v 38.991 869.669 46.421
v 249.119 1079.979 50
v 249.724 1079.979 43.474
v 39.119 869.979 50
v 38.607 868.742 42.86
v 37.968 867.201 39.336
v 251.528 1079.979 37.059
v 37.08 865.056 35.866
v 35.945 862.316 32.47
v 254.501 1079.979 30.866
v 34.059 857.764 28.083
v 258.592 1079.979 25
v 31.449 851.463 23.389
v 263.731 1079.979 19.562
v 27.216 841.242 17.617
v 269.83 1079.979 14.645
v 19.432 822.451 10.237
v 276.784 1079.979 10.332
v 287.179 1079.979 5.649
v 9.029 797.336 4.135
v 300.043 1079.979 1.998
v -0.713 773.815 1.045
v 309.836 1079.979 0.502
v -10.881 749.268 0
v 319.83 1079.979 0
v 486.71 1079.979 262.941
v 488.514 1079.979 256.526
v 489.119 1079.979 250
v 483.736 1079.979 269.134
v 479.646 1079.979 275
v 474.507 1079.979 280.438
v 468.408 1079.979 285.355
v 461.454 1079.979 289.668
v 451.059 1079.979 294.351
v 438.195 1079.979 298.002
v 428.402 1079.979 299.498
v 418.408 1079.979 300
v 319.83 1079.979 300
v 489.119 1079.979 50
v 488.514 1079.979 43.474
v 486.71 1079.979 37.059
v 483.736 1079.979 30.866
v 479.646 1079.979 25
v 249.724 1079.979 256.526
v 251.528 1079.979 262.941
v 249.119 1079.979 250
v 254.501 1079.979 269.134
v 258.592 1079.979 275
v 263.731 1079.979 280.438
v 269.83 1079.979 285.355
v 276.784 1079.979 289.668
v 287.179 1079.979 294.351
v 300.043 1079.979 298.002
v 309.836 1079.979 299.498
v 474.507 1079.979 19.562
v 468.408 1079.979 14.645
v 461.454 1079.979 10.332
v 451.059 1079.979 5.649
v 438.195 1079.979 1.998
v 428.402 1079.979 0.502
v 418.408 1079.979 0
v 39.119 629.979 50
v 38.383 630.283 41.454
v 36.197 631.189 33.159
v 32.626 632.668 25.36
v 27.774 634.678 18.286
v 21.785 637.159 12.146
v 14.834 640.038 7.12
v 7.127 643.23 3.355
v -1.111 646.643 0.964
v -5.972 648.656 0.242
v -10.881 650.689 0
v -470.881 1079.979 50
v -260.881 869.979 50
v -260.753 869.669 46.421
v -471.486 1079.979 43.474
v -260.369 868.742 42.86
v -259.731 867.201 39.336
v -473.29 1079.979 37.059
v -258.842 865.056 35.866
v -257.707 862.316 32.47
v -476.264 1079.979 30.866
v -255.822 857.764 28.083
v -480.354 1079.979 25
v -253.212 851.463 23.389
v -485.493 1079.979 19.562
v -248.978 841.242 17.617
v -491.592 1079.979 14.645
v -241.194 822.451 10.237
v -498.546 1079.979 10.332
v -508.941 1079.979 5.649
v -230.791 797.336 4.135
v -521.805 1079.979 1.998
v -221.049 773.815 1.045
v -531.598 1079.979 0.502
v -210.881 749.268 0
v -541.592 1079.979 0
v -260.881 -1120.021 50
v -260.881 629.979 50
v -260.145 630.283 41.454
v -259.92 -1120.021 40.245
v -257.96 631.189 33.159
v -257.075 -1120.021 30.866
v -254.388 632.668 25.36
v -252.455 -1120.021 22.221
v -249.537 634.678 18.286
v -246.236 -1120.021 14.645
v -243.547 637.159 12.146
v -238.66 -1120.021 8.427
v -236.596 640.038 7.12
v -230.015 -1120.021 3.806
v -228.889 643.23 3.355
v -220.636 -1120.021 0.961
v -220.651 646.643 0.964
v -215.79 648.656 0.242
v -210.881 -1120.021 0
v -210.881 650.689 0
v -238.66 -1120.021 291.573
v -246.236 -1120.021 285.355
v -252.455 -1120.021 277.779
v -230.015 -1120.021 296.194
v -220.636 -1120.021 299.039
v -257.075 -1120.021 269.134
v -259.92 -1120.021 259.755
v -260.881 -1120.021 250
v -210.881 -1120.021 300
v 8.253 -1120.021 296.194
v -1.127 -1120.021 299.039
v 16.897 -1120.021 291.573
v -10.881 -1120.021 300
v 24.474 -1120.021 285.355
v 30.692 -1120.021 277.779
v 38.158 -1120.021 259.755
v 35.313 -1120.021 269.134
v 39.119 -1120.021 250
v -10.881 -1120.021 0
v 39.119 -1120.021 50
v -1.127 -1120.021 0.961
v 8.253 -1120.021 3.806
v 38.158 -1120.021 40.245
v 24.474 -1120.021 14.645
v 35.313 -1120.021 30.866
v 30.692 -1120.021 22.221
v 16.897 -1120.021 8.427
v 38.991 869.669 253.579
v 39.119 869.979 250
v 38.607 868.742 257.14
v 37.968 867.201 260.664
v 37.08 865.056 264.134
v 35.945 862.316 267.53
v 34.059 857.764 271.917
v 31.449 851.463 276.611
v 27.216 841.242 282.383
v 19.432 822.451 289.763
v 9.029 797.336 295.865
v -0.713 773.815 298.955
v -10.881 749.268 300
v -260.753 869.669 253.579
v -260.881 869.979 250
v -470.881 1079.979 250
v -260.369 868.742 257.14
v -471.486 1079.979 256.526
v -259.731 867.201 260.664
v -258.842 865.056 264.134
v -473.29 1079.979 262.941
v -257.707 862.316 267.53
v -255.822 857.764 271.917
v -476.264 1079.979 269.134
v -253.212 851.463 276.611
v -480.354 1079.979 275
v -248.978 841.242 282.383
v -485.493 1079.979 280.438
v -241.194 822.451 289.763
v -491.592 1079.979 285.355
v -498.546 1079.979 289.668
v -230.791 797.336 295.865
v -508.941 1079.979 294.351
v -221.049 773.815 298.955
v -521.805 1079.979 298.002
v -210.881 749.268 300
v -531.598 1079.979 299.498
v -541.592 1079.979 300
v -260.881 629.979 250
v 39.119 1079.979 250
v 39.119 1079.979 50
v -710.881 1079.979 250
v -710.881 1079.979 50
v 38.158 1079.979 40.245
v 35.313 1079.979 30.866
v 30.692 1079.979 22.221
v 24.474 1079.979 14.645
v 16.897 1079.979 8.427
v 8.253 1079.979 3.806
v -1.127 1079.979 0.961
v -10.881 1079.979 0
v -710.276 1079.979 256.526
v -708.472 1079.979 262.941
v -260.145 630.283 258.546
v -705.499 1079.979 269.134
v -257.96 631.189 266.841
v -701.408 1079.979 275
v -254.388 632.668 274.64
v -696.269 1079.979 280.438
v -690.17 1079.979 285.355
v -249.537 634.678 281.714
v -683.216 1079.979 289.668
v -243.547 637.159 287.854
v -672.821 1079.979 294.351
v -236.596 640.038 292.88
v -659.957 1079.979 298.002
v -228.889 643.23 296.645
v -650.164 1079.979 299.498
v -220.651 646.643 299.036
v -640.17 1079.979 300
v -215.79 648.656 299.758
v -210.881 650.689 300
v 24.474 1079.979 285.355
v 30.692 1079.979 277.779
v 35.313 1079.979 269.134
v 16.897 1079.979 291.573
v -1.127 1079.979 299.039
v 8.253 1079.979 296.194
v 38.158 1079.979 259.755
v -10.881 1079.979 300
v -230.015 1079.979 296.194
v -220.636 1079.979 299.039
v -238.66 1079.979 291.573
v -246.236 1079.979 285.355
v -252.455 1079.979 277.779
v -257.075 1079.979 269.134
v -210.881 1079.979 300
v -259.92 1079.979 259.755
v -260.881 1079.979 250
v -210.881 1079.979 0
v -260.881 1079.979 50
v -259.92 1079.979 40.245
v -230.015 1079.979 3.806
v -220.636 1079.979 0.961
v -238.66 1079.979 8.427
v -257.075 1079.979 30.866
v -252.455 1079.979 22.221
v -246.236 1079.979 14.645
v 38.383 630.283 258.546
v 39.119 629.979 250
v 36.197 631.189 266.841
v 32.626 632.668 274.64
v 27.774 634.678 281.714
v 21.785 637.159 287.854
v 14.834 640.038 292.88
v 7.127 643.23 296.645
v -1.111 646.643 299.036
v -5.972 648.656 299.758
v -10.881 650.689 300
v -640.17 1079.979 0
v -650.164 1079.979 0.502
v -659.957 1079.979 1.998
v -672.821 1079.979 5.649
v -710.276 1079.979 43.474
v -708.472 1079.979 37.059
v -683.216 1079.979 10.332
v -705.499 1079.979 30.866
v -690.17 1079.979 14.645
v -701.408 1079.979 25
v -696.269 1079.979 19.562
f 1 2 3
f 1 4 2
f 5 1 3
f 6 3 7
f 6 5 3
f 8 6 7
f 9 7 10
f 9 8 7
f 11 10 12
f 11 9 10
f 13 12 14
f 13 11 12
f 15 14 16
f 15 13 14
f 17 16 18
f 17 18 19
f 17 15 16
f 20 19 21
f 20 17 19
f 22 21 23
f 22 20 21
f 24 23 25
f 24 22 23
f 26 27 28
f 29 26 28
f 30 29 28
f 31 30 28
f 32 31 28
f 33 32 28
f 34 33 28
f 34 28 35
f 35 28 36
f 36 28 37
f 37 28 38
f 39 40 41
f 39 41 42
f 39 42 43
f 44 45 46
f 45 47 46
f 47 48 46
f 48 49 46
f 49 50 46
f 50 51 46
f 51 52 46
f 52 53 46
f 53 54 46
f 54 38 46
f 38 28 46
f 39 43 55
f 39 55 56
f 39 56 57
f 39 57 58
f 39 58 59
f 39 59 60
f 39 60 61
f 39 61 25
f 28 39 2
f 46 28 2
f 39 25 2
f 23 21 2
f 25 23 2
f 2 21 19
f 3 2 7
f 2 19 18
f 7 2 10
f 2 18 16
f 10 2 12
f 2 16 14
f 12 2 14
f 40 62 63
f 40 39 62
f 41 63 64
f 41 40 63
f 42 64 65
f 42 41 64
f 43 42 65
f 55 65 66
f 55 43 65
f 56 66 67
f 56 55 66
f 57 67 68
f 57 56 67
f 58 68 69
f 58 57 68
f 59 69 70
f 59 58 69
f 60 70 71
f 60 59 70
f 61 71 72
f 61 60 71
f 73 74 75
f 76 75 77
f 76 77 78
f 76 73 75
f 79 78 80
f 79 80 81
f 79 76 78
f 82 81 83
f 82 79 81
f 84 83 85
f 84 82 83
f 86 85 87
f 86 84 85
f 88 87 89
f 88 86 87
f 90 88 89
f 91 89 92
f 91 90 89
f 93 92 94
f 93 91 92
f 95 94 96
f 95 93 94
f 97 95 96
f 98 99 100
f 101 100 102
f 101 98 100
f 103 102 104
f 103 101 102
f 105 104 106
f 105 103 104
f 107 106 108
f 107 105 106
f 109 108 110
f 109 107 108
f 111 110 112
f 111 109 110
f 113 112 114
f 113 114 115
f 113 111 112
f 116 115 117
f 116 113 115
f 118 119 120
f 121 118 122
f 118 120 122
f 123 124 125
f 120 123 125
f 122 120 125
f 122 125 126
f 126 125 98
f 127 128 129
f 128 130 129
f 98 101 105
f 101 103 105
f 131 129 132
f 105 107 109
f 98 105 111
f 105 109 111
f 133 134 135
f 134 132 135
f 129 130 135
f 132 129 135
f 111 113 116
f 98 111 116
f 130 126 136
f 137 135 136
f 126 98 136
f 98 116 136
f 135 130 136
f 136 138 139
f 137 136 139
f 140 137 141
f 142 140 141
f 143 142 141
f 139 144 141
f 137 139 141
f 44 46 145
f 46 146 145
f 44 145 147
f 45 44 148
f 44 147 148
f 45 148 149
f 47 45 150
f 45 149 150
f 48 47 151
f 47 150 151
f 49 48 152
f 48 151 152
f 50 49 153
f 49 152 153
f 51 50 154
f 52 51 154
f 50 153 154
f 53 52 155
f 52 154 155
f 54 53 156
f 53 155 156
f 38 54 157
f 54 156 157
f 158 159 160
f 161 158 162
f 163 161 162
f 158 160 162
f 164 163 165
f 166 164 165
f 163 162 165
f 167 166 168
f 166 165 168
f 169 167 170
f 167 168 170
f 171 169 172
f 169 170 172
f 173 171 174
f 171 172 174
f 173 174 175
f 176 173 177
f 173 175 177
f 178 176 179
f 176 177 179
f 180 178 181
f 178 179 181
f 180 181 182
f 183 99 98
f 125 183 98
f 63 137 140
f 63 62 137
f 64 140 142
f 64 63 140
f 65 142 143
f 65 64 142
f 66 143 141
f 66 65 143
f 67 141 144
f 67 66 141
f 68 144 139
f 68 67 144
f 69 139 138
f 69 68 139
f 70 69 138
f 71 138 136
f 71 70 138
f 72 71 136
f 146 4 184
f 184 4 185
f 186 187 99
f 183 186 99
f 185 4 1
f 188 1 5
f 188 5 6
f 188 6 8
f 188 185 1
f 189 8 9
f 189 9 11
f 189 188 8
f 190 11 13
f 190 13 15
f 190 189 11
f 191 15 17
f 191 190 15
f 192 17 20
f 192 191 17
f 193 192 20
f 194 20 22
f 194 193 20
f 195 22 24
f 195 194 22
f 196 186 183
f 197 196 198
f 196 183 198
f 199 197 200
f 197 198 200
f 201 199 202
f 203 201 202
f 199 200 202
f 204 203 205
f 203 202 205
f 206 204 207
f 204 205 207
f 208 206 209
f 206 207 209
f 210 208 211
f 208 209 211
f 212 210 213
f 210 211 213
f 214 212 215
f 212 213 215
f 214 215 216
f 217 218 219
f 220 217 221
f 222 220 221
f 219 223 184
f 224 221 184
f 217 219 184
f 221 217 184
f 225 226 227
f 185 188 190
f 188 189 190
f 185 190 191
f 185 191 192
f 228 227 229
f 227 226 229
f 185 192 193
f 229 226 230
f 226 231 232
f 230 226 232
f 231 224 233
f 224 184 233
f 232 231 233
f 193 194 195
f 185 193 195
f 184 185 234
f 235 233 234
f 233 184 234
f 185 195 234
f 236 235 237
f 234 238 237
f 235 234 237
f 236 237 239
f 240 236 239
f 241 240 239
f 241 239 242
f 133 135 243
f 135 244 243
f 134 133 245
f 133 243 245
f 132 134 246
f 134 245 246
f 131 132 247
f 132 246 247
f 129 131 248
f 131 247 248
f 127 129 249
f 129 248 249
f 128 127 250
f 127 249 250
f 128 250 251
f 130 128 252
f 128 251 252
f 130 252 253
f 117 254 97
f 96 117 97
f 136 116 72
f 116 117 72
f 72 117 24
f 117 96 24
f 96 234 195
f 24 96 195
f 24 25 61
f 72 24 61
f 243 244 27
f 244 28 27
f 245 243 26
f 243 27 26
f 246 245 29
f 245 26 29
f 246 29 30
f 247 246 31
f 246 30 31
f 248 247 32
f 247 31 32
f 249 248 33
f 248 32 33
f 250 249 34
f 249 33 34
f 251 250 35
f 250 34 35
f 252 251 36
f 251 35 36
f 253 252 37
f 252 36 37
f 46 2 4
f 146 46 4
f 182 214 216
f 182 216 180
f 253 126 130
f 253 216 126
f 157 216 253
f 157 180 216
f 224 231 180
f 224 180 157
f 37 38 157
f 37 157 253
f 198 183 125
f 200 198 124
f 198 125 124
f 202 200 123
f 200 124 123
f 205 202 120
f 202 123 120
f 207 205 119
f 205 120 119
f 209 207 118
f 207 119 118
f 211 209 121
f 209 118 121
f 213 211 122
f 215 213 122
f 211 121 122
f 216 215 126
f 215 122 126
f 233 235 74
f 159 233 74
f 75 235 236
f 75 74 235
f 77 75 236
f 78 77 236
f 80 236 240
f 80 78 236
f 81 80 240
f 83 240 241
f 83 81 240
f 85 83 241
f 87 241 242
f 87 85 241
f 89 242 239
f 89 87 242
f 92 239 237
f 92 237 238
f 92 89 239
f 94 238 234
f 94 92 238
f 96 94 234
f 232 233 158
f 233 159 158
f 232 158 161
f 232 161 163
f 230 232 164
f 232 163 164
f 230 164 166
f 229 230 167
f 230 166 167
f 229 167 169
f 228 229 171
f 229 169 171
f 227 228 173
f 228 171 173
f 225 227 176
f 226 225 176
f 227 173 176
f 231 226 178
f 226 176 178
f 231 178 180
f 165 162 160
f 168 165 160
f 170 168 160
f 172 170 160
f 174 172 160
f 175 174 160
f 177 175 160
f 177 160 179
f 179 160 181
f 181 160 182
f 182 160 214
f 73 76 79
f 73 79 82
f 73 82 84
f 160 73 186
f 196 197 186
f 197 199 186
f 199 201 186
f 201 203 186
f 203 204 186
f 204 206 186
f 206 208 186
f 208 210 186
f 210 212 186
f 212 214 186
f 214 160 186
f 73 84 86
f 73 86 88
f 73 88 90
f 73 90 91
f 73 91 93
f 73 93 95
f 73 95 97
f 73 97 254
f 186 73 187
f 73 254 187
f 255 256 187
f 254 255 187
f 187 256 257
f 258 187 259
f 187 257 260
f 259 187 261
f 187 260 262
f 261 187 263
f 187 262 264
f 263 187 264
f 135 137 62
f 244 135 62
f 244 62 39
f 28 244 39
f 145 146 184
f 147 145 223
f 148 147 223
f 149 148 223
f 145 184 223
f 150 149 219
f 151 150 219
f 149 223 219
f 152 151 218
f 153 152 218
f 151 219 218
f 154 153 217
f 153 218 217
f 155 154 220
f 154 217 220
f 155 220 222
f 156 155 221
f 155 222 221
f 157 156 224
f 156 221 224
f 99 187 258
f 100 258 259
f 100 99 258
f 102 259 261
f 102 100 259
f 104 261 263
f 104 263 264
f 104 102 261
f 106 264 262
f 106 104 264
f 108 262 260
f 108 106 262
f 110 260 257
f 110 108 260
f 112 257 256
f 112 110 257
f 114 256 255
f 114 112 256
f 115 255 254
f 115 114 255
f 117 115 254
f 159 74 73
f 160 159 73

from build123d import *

# Parameters (mm, degrees)
F1_DEPTH = 300
F2_R     = 50


with BuildPart() as f1:
    # F0 (on Top) → F1 (new body)
    with BuildSketch(Plane.XY):
        Polygon((-260.881037, 629.978729), (-260.881037, -1120.021271), (39.118963, -1120.021271), (39.118963, 629.978729), (489.118963, 1079.978729), (249.118963, 1079.978729), (39.118963, 869.978729), (39.118963, 1079.978729), (-260.881037, 1079.978729), (-260.881037, 869.978729), (-470.881037, 1079.978729), (-710.881037, 1079.978729), align=None)
    extrude(amount=F1_DEPTH)

    # F2
    f2_edges = [f1.edges().sort_by_distance(p)[0] for p in [
        (-260.881037, -245.021271, 300),
        (39.118963, -245.021271, 300),
        (39.118963, -245.021271, 0),
        (-260.881037, -245.021271, 0),
        (39.118963, 974.978729, 0),
        (-260.881037, 974.978729, 0),
        (39.118963, 974.978729, 300),
        (-260.881037, 974.978729, 300),
        (-365.881037, 974.978729, 300),
        (-485.881037, 854.978729, 300),
        (264.118963, 854.978729, 300),
        (264.118963, 854.978729, 0),
        (144.118963, 974.978729, 0),
        (-365.881037, 974.978729, 0),
        (-485.881037, 854.978729, 0),
        (144.118963, 974.978729, 300),
    ]]
    fillet(f2_edges, radius=F2_R)


solid = f1.part
